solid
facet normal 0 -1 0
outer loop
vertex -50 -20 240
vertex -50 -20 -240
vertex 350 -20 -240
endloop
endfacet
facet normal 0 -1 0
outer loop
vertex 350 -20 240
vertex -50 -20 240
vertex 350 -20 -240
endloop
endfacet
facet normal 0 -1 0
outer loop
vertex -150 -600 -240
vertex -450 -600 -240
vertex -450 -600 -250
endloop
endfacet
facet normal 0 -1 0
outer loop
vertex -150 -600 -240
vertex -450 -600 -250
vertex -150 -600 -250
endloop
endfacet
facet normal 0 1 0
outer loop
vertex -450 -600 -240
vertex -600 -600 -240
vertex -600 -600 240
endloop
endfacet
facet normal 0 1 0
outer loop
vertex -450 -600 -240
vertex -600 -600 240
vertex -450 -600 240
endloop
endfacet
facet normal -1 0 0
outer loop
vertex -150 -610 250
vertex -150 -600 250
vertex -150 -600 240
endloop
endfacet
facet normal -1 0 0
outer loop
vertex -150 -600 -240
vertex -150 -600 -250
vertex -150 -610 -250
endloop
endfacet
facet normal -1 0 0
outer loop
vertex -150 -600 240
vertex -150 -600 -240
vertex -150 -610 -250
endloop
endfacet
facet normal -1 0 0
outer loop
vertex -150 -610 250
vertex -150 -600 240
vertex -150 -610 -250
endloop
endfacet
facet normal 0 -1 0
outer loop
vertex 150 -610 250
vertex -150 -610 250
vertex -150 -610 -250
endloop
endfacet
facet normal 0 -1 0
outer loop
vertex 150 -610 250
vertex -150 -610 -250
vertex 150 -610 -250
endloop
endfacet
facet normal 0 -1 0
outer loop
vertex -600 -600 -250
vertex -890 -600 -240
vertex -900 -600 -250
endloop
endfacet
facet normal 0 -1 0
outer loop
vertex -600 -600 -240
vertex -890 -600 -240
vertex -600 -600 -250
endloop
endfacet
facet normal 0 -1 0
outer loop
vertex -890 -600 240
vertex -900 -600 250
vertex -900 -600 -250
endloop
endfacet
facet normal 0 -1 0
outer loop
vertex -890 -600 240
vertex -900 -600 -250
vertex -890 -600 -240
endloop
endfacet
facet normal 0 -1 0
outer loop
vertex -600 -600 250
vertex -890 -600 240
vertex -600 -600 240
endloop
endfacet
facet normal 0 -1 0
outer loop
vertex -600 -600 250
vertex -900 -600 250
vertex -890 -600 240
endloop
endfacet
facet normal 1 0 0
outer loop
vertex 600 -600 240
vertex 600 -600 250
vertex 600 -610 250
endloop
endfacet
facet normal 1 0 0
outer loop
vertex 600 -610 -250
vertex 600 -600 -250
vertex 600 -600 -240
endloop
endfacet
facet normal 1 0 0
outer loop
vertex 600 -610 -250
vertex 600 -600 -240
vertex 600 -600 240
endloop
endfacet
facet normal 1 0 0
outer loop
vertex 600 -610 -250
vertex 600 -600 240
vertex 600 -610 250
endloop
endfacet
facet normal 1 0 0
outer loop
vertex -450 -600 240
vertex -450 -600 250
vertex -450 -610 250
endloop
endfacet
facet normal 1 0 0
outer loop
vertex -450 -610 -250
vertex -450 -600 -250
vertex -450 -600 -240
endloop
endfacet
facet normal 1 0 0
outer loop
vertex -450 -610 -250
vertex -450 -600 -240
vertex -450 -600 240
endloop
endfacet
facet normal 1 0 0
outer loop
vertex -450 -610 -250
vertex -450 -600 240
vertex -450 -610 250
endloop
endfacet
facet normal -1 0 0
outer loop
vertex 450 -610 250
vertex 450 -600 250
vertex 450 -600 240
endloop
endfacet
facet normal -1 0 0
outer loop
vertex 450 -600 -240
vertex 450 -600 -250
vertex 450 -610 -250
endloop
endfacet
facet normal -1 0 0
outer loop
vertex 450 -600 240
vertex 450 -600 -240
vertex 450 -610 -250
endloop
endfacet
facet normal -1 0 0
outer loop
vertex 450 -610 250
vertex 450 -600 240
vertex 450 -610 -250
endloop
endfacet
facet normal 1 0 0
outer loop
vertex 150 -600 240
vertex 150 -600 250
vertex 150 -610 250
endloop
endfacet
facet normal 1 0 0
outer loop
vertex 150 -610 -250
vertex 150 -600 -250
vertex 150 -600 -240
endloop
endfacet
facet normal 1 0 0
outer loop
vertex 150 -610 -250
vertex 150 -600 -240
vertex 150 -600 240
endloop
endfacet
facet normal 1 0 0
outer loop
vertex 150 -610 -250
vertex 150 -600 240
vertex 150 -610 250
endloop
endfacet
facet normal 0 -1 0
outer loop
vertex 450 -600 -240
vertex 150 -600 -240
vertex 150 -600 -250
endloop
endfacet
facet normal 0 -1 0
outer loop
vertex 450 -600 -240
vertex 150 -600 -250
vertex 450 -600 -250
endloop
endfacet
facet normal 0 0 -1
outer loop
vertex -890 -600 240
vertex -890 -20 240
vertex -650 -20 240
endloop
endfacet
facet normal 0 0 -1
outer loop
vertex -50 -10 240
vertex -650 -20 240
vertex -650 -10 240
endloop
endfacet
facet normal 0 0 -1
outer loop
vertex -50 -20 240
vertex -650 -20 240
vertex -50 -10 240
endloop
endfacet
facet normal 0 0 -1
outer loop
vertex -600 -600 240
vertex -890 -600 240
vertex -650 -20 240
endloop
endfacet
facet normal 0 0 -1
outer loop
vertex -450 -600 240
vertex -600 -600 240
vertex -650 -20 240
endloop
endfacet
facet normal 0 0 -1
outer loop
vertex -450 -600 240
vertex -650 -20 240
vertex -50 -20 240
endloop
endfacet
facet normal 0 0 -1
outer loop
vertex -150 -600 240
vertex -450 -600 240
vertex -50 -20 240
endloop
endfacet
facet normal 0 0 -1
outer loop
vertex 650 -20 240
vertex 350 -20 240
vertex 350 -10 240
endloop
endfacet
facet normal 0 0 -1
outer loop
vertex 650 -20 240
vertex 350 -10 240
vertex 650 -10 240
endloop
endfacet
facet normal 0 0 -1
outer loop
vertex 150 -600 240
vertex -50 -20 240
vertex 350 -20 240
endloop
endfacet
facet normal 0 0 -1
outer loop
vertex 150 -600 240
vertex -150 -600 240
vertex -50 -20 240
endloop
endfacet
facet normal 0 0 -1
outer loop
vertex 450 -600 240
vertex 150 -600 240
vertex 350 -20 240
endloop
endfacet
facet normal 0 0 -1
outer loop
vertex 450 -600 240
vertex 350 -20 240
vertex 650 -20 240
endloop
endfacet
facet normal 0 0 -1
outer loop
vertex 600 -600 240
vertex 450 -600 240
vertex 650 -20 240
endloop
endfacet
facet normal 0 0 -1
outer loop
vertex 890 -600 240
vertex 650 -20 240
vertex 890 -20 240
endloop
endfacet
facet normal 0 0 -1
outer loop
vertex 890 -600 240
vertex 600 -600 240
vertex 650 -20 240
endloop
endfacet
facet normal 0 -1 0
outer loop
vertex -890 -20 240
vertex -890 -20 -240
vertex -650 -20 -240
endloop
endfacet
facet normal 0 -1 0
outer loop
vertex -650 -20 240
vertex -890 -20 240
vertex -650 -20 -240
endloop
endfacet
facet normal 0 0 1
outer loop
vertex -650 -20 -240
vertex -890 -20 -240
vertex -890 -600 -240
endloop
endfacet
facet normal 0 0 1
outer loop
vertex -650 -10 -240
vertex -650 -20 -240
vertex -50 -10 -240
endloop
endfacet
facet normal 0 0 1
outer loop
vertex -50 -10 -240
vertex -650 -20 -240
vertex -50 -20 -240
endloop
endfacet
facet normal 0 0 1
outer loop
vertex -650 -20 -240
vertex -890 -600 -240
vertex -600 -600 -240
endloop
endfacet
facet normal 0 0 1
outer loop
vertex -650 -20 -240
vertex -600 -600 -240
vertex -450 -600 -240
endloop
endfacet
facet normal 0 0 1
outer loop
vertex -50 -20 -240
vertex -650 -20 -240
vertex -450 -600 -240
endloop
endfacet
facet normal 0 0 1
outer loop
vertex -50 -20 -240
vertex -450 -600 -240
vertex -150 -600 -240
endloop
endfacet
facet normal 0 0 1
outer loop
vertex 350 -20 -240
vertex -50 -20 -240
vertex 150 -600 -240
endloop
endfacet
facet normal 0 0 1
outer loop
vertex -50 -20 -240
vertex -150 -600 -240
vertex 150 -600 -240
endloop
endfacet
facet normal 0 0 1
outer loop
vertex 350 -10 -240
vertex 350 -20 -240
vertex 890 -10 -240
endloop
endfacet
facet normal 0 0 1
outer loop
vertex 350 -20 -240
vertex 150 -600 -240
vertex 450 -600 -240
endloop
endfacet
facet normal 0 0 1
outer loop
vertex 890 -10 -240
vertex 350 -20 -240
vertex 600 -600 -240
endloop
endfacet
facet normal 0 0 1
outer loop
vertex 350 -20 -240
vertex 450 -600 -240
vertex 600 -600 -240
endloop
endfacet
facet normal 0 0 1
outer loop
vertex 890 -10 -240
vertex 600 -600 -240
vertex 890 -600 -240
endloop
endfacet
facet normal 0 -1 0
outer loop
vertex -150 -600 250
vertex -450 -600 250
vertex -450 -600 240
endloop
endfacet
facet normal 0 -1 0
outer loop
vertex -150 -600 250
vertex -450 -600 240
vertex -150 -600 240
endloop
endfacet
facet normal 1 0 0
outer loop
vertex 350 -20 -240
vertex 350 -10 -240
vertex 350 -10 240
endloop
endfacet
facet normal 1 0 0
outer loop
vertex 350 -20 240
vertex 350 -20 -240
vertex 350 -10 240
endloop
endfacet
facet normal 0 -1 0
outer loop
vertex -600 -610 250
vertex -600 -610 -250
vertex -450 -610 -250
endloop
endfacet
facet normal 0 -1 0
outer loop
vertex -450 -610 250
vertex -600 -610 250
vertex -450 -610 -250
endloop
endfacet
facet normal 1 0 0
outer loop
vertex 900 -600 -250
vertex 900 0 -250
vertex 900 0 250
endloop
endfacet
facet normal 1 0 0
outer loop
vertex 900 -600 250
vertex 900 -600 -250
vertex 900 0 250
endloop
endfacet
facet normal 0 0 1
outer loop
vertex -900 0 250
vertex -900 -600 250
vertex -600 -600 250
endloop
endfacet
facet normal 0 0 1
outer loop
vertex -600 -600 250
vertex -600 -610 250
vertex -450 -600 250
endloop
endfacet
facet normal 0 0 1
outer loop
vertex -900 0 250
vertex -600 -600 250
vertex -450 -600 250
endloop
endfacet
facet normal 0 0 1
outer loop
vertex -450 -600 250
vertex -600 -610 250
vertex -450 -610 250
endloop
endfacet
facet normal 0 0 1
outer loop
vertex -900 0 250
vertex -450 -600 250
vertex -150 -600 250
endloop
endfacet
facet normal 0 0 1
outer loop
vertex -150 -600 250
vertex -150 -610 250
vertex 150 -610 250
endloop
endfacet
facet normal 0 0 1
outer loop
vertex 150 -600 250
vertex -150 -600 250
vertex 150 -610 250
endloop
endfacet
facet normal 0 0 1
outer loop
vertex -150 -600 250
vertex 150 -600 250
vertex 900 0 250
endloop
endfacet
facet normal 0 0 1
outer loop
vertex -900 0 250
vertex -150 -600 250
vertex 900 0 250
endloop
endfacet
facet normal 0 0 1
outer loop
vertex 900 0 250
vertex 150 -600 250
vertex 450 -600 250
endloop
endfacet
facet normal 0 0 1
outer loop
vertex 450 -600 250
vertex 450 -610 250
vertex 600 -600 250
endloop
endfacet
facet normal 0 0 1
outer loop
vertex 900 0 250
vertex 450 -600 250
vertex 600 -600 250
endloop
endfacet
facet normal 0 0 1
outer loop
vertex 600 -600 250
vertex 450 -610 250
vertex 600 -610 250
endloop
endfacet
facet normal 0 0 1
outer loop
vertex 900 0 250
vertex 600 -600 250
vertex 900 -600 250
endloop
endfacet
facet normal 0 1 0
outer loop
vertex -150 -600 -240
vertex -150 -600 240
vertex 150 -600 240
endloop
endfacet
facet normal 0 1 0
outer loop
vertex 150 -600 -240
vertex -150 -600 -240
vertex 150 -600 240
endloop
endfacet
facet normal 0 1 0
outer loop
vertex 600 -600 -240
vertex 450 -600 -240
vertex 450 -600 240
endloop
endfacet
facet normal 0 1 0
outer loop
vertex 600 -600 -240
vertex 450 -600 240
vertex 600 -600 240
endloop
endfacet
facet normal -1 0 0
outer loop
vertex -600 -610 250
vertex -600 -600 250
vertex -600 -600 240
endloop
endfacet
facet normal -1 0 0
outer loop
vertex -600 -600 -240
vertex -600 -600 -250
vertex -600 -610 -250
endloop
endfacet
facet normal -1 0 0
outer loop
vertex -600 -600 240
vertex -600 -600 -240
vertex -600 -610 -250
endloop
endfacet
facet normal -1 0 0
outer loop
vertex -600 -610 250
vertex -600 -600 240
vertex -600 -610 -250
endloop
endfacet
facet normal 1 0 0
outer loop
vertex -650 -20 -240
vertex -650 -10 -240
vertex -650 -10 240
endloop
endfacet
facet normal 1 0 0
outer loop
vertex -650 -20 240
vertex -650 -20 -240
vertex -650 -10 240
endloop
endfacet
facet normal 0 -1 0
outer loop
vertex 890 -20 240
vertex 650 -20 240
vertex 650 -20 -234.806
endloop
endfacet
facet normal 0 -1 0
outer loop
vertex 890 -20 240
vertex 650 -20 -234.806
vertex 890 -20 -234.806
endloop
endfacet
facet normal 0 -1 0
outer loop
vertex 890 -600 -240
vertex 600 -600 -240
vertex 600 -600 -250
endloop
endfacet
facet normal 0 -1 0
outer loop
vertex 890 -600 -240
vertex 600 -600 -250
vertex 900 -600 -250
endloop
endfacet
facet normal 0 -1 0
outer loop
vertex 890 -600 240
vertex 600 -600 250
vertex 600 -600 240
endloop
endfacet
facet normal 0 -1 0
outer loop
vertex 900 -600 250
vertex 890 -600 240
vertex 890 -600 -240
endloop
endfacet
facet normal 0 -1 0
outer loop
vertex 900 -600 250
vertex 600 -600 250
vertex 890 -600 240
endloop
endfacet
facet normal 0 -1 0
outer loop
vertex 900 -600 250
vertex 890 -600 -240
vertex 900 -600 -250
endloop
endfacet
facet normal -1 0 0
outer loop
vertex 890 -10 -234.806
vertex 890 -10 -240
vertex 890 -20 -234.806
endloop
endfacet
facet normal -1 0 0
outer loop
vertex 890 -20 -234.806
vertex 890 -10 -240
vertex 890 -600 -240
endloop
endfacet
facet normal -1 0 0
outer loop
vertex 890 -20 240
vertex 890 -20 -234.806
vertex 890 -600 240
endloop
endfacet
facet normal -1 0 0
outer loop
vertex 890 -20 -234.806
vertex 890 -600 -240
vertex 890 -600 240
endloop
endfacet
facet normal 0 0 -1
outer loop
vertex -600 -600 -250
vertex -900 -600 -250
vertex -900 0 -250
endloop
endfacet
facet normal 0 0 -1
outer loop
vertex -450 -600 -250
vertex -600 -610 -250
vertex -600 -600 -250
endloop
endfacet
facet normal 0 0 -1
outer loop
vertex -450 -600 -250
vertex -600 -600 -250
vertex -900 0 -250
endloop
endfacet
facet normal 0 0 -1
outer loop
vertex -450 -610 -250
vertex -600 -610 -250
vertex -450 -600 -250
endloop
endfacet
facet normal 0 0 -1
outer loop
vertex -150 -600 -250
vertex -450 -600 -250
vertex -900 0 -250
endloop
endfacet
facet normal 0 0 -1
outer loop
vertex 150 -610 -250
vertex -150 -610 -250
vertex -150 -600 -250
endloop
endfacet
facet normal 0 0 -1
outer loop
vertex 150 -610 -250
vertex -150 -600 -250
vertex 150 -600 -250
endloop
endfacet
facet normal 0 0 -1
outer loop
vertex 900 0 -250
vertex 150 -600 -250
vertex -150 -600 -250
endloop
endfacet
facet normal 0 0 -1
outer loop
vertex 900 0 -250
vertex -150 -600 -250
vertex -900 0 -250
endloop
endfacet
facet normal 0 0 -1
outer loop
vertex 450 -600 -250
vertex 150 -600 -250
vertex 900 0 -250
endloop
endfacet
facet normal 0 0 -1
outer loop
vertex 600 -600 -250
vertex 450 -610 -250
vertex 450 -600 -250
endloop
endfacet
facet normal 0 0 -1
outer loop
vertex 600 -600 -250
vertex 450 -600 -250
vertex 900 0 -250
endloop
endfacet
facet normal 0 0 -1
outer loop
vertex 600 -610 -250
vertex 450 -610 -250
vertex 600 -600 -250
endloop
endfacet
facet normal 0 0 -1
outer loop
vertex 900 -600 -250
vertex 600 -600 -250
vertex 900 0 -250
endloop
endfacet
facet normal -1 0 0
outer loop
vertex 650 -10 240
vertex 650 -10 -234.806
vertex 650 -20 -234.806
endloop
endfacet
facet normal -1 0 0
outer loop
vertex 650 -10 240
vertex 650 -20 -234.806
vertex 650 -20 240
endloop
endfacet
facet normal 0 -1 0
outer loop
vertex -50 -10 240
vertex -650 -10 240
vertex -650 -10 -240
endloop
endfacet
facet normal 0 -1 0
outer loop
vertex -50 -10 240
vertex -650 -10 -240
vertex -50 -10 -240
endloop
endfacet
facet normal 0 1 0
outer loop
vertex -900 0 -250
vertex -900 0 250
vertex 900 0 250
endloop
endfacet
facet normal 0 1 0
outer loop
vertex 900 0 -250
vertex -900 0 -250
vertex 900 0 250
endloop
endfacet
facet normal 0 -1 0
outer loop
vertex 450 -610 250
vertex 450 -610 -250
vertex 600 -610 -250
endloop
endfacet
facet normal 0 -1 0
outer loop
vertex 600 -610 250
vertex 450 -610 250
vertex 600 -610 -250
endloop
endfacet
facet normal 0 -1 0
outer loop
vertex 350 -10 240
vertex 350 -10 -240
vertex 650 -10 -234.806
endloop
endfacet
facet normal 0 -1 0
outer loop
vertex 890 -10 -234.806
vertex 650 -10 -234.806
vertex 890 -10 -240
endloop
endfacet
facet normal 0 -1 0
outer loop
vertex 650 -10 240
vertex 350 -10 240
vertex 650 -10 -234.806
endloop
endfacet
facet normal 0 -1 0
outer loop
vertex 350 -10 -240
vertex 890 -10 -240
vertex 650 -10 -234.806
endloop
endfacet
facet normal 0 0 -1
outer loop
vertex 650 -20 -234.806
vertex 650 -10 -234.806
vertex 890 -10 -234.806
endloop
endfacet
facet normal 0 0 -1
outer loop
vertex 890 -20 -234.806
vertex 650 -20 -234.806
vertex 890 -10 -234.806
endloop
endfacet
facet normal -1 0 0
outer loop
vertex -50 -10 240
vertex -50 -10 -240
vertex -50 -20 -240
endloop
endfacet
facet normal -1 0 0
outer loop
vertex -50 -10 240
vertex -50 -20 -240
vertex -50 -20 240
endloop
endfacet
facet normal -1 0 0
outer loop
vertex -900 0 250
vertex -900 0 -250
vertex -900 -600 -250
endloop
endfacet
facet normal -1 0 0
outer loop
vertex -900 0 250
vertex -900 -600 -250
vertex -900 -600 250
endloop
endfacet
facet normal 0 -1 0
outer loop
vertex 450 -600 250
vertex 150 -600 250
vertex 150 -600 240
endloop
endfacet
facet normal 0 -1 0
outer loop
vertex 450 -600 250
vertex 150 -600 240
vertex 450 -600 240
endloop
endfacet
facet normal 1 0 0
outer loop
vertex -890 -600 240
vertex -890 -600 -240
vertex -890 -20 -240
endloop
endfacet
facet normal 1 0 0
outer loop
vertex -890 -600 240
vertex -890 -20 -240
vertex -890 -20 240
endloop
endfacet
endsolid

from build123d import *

# Parameters (mm, degrees)
F0_W     = 1800
F0_H     = 500
F1_DEPTH = 600
F2_W     = 1780
F2_H     = 480
F3_DEPTH = 590
F5_W     = 150
F5_H     = 10
F5_W_2   = 300
F7_DEPTH = 500
F6_W     = 240
F6_H     = 480
F6_W_2   = 400
F6_H_2   = 474.8058223724
F8_DEPTH = 10


with BuildPart() as f1:
    # F0 (on Front) → F1 (new body)
    with BuildSketch(Plane.XZ):
        Rectangle(F0_W, F0_H)
    extrude(amount=F1_DEPTH)

    # F2 (on face) → F3 (cut)
    with BuildSketch(Plane.XZ.offset(600)):
        Rectangle(F2_W, F2_H)
    extrude(amount=-F3_DEPTH, mode=Mode.SUBTRACT)

    # F5 (on face) → F7 (join)
    with BuildSketch(Plane(origin=(0, 0, -250), x_dir=(1, 0, 0), z_dir=(0, 0, -1))):
        with Locations((525, 605)):
            Rectangle(F5_W, F5_H)
        with Locations((0, 605)):
            Rectangle(F5_W_2, F5_H)
        with Locations((-525, 605)):
            Rectangle(F5_W, F5_H)
    extrude(amount=-F7_DEPTH)

    # F6 (on face) → F8 (join)
    with BuildSketch(Plane.XZ.offset(10)):
        with Locations((-770, 0)):
            Rectangle(F6_W, F6_H)
        with Locations((150, 0)):
            Rectangle(F6_W_2, F6_H)
        with Locations((770, 2.5970888138)):
            Rectangle(F6_W, F6_H_2)
    extrude(amount=F8_DEPTH)


solid = f1.part
